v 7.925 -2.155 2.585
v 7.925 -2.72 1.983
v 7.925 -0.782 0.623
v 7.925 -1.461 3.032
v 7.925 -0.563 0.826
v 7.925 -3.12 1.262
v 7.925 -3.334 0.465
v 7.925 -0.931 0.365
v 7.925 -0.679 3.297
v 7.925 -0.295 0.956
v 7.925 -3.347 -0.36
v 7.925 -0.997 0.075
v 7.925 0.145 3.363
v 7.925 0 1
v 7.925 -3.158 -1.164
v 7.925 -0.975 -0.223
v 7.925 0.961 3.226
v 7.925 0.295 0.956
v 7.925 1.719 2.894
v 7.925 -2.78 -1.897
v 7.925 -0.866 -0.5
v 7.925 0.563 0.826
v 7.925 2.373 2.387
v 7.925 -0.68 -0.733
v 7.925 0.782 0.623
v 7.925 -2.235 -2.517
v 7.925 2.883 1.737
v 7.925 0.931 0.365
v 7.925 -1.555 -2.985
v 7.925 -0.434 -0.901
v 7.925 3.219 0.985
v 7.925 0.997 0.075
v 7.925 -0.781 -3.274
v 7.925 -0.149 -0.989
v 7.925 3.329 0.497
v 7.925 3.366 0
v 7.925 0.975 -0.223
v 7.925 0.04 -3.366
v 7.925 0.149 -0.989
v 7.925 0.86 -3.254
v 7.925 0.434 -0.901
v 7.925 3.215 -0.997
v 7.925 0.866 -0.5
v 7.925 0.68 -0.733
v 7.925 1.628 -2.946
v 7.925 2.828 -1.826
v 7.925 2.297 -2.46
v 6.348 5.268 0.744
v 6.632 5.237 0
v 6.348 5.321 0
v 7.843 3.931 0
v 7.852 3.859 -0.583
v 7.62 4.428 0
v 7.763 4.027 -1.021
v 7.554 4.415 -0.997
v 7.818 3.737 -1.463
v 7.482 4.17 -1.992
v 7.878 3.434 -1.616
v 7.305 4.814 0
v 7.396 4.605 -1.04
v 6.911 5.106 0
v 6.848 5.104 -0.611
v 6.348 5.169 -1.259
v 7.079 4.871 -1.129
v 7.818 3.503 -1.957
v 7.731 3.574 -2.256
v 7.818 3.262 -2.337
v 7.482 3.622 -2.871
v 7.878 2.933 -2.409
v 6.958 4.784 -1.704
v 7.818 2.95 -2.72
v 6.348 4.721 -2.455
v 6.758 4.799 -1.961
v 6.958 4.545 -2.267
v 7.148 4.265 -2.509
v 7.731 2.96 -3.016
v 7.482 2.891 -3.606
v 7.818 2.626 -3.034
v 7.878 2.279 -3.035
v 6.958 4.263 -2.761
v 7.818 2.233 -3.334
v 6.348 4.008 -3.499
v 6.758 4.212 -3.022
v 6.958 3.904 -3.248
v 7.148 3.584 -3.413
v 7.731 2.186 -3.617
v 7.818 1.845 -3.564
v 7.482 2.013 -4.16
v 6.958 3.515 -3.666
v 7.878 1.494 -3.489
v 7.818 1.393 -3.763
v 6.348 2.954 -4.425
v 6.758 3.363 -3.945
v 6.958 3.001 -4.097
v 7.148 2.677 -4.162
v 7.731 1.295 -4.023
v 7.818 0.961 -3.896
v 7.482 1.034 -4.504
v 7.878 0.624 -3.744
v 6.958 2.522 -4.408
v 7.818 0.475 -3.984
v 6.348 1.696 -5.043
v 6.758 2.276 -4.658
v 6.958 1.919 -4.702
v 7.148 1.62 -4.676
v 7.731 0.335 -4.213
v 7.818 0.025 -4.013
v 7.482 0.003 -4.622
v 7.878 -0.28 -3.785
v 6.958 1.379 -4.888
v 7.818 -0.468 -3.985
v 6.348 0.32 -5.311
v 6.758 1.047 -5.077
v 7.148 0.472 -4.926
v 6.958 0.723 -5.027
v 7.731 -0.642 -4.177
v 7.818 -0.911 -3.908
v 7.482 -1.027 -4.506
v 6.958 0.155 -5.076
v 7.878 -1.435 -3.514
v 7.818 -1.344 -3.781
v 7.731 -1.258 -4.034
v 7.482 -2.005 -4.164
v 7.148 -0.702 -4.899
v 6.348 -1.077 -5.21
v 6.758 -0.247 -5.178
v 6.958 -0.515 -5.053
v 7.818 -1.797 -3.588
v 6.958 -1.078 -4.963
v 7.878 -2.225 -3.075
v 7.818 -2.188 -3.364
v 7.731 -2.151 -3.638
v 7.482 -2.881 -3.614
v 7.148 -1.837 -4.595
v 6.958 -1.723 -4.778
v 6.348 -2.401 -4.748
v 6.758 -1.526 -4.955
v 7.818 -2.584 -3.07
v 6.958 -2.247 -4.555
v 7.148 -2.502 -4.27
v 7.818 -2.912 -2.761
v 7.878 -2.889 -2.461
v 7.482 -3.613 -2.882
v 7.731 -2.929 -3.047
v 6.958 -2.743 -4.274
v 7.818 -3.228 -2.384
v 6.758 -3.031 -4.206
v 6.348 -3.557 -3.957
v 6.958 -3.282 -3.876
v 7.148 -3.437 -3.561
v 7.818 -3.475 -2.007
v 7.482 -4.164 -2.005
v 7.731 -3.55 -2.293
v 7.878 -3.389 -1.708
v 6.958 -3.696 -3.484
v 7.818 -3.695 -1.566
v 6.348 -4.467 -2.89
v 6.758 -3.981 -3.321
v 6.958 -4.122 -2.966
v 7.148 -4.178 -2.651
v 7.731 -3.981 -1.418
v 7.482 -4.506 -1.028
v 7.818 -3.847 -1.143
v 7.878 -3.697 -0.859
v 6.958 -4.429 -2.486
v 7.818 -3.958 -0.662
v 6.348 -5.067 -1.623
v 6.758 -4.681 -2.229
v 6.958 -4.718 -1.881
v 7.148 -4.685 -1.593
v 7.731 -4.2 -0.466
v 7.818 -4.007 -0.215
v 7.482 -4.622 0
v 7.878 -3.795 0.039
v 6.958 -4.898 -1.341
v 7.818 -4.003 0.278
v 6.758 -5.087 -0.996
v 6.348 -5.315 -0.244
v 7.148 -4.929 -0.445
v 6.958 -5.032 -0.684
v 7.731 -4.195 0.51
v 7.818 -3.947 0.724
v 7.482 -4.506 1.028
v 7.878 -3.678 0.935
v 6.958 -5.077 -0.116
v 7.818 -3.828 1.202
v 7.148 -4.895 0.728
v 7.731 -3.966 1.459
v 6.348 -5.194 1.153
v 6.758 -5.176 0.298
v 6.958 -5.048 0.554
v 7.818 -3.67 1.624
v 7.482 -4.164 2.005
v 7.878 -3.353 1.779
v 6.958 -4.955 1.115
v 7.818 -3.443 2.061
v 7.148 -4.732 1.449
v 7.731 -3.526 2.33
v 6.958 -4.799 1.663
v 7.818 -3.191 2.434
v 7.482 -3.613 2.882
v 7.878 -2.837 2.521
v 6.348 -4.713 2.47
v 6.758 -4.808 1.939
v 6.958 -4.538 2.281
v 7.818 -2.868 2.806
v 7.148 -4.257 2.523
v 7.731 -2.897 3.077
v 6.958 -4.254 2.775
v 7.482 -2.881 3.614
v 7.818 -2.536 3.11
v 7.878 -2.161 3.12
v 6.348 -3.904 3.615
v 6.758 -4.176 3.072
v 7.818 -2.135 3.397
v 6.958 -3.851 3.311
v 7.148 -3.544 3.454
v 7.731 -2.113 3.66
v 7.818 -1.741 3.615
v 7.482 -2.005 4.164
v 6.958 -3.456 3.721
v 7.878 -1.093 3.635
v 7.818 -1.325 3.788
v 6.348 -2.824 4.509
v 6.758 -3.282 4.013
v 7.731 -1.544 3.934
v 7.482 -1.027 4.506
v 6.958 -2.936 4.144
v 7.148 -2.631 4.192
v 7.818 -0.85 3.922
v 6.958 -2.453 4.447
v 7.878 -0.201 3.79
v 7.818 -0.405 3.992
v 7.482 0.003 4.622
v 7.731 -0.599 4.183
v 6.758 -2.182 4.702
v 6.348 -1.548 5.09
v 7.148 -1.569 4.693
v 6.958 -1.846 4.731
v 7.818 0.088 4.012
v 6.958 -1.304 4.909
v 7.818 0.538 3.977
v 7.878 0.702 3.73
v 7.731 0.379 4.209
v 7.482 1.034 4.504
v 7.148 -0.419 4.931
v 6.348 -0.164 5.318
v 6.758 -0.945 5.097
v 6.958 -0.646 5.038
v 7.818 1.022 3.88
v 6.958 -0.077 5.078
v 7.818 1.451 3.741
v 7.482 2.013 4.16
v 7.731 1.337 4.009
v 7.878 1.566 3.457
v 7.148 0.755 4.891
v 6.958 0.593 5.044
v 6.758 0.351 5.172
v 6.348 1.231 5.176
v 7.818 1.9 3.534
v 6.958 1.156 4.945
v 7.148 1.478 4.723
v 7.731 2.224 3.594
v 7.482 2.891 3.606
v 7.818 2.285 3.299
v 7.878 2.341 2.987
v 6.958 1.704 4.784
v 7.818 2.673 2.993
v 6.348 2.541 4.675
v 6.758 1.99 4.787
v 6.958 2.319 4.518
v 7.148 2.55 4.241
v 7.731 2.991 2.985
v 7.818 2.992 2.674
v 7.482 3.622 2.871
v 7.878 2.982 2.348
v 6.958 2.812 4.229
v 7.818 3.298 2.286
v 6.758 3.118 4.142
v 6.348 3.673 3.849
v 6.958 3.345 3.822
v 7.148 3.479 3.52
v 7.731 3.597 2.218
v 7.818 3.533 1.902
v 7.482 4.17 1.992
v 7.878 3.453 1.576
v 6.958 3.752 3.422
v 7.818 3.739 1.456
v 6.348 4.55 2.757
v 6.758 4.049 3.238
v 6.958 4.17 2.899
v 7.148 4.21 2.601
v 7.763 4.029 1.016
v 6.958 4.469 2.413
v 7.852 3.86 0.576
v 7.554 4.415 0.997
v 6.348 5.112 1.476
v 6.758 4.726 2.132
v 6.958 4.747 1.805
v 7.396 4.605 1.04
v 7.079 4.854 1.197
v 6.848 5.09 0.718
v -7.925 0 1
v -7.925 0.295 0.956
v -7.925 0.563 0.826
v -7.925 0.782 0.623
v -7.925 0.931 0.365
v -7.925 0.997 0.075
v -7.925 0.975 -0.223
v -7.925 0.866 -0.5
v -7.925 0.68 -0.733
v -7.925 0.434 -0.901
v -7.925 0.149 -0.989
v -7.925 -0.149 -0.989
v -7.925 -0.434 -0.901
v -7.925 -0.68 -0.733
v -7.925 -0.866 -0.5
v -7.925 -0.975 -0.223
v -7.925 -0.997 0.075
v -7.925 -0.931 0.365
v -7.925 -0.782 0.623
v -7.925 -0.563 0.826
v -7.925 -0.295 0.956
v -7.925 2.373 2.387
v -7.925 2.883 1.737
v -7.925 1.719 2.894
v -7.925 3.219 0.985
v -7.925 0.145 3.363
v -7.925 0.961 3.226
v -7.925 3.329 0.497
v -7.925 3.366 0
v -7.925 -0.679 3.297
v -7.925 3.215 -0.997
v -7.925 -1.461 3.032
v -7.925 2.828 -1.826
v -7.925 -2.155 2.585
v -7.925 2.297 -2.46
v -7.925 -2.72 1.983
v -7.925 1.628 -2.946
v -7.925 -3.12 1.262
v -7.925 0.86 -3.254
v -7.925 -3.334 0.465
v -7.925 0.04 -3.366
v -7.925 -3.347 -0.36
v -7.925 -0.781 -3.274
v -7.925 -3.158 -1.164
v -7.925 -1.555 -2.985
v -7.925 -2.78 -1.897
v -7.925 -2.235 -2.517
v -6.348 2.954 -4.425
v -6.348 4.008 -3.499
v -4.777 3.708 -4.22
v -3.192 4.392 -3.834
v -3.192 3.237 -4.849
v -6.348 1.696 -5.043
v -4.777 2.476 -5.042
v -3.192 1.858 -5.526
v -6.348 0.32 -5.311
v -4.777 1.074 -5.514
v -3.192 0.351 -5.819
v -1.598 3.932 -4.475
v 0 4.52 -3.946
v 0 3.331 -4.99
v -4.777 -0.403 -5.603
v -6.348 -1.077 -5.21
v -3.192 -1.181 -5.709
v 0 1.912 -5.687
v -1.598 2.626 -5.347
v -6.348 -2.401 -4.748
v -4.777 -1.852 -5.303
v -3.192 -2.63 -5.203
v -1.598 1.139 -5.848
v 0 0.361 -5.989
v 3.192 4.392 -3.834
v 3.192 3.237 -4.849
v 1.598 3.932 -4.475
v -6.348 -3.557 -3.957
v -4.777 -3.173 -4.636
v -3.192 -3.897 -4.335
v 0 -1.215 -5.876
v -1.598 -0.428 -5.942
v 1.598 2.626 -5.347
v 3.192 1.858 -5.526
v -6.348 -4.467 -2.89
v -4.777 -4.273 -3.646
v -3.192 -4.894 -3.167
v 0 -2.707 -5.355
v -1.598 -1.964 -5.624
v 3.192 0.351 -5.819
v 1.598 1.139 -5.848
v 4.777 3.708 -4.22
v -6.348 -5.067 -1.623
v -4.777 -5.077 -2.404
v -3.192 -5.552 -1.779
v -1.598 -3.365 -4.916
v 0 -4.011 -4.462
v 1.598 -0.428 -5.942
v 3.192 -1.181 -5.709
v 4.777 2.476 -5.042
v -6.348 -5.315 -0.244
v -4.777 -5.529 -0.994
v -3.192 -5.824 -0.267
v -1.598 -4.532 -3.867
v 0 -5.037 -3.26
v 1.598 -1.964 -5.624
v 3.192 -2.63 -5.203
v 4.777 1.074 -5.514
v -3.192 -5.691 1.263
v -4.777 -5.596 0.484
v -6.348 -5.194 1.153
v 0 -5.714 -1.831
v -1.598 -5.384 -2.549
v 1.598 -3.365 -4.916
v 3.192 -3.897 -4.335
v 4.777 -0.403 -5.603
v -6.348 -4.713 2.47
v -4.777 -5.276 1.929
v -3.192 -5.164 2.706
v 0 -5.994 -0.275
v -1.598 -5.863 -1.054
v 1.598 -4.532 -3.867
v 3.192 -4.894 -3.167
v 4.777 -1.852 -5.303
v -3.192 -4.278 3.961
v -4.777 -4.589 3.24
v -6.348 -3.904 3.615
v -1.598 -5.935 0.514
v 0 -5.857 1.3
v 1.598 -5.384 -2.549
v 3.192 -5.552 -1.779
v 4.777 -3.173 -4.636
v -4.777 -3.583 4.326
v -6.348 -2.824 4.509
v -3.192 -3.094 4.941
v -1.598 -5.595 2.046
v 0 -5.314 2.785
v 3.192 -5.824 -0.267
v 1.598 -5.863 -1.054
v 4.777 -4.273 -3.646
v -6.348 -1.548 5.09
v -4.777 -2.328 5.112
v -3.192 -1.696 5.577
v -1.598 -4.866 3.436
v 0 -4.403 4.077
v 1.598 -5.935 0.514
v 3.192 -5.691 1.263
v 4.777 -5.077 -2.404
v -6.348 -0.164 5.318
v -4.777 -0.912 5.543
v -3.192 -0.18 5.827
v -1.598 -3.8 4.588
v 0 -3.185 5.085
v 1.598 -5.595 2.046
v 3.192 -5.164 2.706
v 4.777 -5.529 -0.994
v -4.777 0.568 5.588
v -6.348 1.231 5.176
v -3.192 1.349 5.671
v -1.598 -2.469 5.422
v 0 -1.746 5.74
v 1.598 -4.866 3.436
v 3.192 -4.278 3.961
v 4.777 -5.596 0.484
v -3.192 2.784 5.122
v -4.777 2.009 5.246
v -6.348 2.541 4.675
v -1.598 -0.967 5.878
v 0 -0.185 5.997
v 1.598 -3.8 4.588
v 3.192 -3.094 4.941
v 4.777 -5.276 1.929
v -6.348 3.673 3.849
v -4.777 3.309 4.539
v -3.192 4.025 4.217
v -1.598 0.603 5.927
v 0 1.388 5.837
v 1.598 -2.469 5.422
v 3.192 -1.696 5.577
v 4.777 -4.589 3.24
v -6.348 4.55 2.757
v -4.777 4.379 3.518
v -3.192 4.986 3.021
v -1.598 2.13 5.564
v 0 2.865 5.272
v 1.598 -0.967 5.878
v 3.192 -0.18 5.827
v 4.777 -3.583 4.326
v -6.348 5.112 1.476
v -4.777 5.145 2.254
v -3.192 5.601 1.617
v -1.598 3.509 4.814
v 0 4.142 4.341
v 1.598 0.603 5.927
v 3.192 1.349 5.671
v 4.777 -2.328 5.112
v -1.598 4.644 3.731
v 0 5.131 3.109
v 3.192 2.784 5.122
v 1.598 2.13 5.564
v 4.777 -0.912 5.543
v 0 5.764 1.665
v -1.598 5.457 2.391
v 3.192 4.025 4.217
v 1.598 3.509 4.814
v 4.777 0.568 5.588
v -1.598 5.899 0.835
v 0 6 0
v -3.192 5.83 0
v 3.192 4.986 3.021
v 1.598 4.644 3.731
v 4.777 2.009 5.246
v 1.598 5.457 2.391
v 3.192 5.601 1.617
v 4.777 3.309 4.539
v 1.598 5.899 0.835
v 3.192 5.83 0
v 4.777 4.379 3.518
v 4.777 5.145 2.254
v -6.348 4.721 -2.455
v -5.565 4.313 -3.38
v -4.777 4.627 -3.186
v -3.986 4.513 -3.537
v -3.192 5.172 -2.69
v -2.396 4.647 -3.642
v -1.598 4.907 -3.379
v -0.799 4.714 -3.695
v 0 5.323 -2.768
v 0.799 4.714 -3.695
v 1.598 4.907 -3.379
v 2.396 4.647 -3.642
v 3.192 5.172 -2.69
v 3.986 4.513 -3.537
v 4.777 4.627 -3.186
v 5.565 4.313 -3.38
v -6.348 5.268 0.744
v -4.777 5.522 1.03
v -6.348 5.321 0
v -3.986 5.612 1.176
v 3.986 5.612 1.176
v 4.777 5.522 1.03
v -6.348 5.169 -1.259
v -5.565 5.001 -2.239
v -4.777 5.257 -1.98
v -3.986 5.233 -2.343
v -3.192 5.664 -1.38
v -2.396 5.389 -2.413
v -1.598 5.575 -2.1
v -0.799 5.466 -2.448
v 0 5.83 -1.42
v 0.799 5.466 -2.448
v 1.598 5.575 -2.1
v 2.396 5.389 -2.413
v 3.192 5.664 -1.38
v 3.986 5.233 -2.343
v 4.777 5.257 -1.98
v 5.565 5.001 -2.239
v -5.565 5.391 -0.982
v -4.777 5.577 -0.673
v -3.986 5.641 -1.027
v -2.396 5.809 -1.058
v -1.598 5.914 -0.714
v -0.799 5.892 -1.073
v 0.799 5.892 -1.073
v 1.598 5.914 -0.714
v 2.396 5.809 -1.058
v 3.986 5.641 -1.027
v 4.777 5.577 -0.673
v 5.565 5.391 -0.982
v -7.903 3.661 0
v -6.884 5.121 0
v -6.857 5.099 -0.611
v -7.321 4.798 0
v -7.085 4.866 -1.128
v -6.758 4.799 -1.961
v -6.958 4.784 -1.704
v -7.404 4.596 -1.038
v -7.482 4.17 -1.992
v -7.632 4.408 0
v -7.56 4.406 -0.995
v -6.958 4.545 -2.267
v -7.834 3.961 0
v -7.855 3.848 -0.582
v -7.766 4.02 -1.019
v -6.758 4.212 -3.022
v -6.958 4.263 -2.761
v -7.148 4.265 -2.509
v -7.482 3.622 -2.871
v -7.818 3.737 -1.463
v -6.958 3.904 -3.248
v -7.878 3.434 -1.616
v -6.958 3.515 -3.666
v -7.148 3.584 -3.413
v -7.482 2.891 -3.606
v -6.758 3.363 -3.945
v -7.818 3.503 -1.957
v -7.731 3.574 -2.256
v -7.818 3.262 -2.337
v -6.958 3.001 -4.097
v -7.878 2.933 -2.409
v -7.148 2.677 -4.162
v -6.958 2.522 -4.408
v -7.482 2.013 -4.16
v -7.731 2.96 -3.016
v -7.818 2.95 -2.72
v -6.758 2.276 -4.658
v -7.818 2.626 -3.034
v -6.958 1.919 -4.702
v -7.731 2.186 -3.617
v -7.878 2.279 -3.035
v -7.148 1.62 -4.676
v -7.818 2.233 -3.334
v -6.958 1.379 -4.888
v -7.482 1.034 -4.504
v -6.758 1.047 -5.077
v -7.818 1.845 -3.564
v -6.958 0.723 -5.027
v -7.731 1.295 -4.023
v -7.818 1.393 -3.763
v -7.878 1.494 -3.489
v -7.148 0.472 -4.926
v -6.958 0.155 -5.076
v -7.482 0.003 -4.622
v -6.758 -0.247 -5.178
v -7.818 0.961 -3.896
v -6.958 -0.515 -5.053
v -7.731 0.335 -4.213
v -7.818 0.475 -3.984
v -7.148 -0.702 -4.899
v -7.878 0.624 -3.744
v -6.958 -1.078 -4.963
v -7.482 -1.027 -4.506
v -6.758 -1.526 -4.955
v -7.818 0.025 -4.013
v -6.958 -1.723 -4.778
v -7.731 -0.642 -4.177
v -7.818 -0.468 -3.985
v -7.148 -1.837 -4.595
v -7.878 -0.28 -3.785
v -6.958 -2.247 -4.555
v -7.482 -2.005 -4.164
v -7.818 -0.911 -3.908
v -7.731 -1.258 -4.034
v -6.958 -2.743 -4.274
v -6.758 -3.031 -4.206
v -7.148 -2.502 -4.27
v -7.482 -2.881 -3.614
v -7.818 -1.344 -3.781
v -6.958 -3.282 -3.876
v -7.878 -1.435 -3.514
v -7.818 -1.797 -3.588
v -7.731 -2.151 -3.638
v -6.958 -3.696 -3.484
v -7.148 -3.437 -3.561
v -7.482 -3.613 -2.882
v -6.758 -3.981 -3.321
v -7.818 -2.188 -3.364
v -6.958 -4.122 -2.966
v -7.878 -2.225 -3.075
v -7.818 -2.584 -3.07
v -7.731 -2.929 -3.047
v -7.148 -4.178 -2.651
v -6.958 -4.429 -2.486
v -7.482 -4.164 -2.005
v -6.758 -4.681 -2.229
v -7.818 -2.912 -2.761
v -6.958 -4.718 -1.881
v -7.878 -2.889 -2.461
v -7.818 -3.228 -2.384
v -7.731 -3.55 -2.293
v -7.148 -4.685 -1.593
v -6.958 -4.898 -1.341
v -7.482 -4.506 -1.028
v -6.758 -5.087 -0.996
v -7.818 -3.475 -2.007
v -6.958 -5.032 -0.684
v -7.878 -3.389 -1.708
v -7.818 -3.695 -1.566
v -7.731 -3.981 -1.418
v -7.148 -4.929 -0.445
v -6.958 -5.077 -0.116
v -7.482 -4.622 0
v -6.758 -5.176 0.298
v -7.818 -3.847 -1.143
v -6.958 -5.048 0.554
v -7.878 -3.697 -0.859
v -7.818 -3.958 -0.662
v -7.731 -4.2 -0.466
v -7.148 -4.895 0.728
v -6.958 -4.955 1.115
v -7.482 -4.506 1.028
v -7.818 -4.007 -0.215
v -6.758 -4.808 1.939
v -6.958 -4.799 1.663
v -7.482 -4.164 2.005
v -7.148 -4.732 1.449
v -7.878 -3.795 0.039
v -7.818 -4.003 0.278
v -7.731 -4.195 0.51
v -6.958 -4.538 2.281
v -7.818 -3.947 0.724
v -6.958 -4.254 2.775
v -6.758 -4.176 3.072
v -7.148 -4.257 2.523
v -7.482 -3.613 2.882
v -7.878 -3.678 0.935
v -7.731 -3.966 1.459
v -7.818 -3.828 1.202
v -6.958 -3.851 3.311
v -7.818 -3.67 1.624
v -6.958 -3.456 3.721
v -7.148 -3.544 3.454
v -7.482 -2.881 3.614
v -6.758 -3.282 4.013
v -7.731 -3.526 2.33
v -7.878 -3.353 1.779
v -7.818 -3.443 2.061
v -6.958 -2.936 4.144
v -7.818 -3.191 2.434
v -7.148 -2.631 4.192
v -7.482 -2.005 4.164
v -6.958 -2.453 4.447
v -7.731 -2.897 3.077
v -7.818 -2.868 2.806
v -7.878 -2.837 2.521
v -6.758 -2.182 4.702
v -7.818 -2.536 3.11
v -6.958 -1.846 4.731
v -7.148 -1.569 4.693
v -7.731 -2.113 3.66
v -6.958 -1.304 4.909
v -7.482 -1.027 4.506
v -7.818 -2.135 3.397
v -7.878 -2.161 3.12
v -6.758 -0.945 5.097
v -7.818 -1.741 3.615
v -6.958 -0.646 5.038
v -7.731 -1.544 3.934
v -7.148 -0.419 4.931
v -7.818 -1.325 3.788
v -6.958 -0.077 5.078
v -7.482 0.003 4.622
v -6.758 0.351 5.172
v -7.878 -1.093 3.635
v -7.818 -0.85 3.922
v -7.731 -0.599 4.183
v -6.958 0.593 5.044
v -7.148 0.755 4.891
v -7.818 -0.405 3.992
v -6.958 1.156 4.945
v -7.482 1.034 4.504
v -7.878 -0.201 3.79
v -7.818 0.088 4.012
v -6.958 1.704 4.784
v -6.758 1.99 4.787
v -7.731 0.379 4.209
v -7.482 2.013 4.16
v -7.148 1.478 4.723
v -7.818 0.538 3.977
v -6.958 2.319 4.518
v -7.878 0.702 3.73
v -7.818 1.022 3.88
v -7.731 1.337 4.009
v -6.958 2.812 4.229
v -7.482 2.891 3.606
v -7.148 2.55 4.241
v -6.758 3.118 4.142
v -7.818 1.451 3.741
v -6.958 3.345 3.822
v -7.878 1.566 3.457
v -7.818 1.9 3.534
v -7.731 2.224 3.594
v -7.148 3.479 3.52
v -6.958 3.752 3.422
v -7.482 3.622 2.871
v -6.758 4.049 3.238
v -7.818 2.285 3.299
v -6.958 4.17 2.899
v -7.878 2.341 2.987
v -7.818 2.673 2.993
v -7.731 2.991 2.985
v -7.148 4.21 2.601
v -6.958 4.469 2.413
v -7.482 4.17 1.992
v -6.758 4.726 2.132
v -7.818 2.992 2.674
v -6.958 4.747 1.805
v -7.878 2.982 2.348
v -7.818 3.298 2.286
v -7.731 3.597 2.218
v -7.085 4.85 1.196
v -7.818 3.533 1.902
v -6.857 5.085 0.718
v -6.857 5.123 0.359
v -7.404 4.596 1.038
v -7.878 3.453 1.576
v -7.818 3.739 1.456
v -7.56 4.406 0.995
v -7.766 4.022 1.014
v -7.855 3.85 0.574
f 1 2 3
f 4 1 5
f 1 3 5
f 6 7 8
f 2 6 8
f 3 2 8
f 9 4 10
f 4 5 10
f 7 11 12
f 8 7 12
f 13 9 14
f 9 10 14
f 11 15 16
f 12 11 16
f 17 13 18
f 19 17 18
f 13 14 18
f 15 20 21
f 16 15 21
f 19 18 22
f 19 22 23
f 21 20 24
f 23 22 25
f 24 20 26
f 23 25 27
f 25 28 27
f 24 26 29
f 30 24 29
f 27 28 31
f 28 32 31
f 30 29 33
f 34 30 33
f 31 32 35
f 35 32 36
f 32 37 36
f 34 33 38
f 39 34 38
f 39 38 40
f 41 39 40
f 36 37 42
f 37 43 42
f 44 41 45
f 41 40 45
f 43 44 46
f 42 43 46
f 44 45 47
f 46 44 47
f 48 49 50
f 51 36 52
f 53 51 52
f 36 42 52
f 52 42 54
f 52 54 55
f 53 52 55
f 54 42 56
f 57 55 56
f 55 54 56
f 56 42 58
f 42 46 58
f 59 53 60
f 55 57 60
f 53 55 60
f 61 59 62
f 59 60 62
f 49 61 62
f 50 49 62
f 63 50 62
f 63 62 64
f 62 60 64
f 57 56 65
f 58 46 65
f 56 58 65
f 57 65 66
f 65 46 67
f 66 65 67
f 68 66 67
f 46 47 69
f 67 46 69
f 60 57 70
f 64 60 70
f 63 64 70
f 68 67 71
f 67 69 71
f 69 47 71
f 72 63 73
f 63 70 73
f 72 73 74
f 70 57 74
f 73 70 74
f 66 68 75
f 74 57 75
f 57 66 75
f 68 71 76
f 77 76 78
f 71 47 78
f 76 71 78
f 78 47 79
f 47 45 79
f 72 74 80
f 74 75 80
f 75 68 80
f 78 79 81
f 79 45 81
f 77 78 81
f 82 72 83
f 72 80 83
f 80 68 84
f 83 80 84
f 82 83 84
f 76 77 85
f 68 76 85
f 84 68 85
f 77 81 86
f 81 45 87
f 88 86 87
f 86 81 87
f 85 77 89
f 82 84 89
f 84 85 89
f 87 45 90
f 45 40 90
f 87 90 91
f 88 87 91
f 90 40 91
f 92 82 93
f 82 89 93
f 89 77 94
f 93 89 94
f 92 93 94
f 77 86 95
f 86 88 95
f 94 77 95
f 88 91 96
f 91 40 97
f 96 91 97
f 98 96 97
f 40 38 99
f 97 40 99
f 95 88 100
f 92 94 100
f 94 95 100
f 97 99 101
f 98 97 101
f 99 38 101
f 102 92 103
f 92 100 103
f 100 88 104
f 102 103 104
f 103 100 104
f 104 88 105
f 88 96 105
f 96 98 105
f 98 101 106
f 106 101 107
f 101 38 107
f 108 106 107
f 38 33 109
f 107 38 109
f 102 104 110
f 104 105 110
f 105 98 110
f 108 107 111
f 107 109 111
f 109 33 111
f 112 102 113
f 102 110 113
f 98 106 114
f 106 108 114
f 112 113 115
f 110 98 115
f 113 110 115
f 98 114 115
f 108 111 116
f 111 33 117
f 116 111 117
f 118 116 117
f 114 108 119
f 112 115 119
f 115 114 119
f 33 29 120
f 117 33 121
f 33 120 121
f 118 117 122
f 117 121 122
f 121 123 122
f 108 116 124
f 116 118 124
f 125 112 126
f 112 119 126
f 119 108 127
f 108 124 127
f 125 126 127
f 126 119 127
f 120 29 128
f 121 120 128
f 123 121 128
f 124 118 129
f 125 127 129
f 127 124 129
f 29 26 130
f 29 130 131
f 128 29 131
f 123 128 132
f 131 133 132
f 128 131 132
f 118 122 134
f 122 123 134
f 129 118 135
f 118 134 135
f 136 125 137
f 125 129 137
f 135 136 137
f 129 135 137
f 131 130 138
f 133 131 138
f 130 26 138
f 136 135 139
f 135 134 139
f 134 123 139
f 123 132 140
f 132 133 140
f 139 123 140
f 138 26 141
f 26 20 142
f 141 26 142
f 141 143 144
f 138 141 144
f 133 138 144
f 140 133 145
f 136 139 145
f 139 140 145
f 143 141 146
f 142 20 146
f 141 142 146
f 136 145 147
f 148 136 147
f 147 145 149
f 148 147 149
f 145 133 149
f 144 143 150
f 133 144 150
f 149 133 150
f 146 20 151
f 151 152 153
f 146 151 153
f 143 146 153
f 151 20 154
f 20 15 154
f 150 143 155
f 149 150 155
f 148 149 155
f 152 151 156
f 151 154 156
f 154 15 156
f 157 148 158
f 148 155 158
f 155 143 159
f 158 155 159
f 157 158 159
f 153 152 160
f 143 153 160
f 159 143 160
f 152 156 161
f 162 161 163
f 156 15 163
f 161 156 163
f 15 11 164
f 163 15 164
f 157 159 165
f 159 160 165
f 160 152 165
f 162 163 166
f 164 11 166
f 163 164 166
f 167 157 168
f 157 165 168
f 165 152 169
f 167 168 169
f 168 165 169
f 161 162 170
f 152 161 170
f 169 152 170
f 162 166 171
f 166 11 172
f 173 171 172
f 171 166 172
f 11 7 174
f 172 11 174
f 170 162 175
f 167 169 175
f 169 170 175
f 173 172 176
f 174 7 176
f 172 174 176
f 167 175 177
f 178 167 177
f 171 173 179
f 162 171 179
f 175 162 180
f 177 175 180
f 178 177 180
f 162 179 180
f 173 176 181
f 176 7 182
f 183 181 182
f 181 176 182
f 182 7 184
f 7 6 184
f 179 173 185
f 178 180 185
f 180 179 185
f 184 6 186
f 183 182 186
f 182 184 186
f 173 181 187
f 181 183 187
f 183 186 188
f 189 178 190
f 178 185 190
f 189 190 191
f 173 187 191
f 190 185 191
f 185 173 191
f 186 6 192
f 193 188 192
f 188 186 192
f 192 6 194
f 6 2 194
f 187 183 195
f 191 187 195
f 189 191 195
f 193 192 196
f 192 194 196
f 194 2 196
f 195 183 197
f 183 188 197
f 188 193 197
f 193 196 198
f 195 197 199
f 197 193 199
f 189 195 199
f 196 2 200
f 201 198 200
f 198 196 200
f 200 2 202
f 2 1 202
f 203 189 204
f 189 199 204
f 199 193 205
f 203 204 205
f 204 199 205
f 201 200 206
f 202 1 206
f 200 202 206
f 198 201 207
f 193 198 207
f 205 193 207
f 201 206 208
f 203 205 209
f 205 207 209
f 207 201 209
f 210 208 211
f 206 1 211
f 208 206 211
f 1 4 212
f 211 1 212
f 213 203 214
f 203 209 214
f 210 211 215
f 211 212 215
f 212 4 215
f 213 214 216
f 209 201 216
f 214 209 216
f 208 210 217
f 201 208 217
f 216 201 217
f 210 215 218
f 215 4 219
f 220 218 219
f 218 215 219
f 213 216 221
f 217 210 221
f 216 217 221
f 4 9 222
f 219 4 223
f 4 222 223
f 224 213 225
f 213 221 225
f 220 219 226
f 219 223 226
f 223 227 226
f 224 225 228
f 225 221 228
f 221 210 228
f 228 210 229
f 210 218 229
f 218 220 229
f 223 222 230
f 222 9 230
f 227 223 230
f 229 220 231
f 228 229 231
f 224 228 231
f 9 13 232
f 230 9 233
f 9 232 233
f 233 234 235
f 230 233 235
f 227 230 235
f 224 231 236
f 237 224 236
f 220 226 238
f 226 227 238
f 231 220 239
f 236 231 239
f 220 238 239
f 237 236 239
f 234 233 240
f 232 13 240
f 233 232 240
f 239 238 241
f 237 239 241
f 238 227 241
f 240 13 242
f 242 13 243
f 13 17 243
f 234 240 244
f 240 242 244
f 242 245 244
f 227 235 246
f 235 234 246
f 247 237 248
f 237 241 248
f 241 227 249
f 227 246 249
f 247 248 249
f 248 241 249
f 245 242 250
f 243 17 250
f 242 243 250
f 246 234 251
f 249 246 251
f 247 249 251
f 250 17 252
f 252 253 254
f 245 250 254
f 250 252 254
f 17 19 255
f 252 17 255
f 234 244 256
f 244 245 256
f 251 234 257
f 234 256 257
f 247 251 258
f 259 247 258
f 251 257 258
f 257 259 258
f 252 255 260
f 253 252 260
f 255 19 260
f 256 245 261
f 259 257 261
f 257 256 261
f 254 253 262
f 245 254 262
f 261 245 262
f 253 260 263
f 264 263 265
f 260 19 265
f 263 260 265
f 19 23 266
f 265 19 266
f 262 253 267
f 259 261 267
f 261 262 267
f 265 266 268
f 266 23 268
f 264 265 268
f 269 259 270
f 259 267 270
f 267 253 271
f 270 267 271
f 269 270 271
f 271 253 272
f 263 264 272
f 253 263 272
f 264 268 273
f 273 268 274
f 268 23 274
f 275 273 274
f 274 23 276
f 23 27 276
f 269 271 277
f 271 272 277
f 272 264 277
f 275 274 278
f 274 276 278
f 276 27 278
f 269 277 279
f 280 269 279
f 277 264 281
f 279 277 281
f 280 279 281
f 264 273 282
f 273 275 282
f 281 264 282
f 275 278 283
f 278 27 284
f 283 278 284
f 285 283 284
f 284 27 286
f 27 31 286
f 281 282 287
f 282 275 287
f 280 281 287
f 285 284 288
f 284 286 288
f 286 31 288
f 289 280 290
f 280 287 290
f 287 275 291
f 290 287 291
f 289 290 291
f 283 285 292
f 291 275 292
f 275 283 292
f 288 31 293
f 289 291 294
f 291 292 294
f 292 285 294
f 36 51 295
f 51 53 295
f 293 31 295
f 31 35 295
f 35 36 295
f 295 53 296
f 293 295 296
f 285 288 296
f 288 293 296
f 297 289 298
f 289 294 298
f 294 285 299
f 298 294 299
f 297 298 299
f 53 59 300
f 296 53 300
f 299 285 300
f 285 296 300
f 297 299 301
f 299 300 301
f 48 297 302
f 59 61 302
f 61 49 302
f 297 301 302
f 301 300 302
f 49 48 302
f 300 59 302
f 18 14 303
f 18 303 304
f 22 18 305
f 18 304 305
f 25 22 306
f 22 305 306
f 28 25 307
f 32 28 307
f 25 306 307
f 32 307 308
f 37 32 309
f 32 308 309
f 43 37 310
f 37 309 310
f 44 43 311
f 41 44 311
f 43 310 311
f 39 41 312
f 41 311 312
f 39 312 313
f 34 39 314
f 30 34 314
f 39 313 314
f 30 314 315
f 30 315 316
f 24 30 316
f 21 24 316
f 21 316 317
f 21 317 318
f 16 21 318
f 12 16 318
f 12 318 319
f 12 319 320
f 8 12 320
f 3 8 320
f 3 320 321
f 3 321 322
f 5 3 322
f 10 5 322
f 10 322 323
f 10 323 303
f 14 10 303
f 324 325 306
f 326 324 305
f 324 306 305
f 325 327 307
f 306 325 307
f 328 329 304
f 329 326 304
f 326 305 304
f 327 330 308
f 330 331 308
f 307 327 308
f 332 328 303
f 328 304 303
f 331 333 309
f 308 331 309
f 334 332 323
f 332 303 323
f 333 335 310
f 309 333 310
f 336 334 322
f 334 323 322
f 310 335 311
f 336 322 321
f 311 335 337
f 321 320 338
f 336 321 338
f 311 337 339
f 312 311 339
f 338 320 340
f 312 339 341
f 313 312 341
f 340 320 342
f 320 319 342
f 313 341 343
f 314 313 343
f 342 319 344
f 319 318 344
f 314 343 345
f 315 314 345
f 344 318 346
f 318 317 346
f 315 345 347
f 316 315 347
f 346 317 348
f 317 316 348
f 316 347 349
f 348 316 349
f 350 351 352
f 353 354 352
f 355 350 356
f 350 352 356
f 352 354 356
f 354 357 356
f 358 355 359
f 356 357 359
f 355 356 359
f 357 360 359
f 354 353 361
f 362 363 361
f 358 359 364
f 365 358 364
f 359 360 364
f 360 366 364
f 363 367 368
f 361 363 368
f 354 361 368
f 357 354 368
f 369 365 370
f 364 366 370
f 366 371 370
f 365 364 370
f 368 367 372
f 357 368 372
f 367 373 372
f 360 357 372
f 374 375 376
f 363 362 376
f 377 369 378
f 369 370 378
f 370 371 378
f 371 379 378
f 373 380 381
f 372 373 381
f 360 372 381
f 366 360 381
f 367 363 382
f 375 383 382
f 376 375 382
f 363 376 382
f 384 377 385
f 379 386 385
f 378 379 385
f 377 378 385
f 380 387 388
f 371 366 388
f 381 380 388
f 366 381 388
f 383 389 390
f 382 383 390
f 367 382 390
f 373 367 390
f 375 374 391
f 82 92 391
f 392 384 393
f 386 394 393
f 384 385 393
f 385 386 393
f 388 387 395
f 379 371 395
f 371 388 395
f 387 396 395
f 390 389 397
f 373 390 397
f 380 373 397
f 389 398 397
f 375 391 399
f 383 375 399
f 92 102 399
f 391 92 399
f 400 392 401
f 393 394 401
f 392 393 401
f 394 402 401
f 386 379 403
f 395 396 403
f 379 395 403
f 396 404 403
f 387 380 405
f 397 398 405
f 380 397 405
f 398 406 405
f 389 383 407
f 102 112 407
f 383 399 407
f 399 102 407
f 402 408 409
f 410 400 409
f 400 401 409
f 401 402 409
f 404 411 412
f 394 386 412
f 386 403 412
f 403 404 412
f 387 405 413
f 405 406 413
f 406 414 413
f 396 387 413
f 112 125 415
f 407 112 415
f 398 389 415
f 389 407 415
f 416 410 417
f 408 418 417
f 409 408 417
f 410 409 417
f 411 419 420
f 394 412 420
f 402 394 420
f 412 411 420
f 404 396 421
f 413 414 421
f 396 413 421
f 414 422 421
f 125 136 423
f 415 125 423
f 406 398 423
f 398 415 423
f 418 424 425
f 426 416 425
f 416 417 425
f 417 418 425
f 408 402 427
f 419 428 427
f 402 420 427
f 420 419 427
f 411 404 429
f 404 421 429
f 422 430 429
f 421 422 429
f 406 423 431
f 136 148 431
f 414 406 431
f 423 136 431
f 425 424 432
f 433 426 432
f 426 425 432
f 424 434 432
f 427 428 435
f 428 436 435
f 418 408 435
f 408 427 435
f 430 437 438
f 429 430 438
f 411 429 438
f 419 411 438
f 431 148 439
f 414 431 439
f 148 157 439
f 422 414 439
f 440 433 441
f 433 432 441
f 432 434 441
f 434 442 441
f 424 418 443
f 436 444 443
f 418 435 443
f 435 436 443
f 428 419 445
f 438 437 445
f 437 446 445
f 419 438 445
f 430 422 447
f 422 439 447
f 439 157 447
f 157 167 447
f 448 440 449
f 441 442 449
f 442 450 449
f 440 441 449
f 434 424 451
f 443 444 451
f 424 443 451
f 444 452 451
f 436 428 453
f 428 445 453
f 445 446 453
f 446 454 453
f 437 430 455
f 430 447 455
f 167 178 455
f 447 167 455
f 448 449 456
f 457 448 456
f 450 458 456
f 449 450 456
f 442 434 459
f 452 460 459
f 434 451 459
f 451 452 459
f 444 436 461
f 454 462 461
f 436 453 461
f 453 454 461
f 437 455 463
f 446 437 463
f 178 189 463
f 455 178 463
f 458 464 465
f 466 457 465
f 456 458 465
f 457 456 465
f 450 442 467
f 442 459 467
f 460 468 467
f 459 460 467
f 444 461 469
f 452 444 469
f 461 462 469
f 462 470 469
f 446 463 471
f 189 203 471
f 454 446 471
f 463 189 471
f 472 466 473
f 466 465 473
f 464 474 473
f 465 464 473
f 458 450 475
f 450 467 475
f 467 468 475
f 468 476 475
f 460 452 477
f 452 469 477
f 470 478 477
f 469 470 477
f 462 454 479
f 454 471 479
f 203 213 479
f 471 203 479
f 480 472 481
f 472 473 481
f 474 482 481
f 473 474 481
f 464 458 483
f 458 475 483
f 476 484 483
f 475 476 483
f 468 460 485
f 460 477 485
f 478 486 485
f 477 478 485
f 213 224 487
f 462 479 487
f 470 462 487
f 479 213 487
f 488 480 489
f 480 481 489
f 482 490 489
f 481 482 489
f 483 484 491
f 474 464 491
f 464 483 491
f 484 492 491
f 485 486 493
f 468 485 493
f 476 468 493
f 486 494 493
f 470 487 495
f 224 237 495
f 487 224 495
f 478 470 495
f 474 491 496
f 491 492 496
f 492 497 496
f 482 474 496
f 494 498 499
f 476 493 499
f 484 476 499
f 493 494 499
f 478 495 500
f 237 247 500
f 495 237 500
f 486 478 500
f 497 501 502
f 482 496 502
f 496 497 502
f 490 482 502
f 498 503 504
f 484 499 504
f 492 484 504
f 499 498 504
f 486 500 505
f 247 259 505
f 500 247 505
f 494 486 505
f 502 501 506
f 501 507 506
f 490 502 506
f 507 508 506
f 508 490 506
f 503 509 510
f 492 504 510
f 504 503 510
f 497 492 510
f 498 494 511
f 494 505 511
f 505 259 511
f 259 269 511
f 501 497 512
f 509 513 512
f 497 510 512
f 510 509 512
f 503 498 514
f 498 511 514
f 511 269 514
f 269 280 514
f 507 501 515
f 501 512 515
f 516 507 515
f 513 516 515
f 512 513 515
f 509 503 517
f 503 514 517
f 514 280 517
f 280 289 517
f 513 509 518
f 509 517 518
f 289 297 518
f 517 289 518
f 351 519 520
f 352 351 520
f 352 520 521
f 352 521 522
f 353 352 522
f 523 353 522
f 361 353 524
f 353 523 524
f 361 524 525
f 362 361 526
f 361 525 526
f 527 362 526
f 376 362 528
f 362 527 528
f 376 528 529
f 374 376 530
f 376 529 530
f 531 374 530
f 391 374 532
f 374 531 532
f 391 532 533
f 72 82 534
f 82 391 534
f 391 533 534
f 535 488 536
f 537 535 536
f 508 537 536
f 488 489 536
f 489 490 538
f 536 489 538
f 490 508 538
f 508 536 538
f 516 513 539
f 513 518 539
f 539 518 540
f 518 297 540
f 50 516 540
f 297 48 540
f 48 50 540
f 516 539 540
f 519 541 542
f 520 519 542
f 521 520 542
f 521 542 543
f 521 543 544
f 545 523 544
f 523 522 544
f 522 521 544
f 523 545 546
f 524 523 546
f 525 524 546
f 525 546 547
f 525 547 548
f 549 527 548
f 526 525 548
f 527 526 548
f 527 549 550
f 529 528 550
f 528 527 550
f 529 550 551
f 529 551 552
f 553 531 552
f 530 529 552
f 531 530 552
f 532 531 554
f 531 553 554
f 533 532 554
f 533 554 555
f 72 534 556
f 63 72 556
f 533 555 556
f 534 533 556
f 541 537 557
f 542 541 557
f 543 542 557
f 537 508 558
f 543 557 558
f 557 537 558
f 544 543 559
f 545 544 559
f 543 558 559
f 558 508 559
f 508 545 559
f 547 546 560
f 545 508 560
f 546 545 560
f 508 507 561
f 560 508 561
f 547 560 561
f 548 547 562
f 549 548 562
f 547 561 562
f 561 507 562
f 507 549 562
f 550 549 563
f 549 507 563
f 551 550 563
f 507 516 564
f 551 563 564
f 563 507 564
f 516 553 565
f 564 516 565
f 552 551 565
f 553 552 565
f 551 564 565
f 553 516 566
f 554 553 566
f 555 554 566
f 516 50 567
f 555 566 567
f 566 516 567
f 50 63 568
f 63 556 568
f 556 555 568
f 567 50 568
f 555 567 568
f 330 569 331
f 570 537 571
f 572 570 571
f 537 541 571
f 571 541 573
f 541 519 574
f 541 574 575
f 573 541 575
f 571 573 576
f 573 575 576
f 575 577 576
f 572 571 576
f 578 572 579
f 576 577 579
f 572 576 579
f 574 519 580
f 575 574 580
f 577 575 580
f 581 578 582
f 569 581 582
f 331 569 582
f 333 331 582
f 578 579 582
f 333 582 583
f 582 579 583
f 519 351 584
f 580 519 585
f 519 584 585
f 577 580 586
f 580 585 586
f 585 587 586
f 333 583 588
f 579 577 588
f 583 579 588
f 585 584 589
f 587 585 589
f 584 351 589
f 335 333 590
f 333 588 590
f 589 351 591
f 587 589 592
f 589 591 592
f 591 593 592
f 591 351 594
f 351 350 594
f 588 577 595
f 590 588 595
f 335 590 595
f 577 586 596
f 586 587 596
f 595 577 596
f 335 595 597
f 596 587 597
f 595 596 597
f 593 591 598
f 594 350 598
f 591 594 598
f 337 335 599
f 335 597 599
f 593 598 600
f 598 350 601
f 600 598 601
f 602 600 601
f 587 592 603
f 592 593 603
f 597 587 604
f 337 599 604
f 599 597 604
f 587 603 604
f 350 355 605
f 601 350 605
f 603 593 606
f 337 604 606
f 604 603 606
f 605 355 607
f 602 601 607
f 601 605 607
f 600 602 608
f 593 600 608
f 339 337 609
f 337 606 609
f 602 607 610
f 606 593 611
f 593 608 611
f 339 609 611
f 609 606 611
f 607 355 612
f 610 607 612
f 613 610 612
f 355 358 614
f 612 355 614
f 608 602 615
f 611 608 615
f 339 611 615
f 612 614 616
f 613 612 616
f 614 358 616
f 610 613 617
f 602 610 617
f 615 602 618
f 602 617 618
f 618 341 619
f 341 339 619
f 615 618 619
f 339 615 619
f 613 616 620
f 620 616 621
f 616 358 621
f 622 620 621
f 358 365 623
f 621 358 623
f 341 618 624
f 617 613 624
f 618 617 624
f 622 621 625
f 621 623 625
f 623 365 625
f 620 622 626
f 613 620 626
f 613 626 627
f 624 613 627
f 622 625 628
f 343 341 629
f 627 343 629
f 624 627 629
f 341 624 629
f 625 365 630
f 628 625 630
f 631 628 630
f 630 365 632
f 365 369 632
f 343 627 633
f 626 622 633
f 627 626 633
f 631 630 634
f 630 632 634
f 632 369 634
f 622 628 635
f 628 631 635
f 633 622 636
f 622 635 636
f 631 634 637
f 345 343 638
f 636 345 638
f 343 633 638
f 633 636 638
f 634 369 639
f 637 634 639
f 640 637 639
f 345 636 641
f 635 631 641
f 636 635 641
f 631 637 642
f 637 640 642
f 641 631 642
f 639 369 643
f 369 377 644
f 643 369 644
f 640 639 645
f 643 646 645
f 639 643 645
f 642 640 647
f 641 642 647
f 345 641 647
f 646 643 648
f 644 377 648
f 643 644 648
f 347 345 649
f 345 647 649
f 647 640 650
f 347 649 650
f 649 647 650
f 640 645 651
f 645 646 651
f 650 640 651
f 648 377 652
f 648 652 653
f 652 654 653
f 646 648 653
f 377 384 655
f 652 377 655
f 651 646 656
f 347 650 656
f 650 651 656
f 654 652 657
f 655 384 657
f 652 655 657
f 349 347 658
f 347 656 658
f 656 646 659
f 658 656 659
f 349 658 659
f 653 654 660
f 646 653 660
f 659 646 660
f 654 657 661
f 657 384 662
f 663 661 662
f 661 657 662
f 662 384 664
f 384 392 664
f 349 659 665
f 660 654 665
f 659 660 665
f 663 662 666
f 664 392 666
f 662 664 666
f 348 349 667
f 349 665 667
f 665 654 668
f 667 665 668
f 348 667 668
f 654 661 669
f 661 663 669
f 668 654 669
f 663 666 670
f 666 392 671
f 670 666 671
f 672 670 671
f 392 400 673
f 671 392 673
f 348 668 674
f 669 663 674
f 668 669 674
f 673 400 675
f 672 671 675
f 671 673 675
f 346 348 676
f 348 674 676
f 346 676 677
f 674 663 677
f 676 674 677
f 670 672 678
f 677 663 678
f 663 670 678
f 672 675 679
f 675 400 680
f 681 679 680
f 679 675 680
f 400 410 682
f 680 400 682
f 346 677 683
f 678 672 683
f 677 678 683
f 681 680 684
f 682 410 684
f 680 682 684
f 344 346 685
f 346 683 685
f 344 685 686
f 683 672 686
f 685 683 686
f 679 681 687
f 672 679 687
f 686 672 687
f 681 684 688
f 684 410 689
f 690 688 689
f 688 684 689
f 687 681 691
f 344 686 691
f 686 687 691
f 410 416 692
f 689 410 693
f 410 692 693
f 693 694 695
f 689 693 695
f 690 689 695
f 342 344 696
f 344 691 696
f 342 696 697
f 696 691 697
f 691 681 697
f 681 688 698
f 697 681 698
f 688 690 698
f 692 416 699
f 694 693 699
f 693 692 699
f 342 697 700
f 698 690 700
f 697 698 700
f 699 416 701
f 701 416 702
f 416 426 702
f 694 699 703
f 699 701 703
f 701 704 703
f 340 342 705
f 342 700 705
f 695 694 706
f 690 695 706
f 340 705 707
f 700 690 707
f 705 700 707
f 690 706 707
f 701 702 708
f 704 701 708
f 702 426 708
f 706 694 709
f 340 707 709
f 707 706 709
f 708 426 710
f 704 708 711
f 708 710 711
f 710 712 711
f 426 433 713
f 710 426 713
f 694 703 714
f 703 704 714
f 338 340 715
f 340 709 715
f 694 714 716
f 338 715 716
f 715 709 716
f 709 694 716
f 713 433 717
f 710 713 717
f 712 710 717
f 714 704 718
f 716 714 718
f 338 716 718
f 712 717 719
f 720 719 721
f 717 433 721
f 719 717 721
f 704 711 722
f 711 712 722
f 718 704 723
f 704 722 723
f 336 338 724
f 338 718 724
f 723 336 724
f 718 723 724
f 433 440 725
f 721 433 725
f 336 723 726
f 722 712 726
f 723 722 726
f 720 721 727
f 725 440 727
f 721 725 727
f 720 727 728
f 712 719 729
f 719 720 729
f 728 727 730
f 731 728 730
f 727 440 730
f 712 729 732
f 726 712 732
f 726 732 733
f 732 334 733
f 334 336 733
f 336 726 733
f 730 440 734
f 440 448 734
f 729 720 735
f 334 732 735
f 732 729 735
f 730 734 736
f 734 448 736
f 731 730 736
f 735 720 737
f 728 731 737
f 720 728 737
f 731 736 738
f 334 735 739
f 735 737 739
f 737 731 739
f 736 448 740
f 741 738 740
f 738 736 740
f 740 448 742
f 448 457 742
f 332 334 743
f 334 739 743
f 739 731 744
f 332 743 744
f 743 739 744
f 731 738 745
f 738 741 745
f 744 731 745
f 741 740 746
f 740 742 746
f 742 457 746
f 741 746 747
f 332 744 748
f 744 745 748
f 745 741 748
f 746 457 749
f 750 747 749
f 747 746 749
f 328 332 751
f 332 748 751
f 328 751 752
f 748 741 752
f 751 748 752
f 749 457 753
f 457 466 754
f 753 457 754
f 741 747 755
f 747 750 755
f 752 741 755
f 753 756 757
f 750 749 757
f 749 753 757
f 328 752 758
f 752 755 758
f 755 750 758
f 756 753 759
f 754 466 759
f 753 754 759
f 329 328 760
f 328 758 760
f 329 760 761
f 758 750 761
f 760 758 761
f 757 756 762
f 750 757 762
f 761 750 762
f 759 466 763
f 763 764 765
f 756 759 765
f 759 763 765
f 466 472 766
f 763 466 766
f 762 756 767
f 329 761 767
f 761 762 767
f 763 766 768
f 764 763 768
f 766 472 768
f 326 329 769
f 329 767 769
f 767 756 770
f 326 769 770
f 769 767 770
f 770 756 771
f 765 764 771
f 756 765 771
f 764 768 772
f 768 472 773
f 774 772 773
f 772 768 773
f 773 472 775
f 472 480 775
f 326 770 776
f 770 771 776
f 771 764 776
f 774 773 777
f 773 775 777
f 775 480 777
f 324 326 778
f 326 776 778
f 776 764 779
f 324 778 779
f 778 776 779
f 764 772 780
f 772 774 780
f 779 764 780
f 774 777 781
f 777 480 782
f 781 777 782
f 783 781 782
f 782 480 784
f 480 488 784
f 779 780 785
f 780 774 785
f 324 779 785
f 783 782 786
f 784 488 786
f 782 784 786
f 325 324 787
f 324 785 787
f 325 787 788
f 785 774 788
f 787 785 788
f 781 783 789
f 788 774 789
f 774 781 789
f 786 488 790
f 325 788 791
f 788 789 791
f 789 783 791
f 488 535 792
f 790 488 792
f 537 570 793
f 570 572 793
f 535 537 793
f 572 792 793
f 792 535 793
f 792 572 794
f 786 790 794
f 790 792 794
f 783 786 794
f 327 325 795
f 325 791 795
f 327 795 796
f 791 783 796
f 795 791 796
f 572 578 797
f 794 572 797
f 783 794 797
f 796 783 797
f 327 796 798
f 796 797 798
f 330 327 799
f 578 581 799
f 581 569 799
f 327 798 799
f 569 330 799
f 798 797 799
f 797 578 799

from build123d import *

# Parameters (mm, degrees)
RACCORDO1_R          = 2
RACCORDO2_R          = 2
FORO_0_2_0_2_1_D     = 2
FORO_0_2_0_2_1_DEPTH = 15.85


with BuildPart() as part:
    # Schizzo1 → Rivoluzione1 (revolve)
    with BuildSketch(Plane(origin=(0, 0, 0), x_dir=(-1, 0, 0), z_dir=(0, 0, -1))):
        with BuildLine():
            Line((-7.925, 4.934311379), (-7.925, 0))
            Line((-7.925, 0), (7.925, 0))
            Line((7.925, 0), (7.925, 4.934311379))
            ThreePointArc((7.925, 4.934311379), (0, 6), (-7.925, 4.934311379))
        make_face()
    revolve(axis=Axis((7.925, 0, 0), (-1, 0, 0)))

    # Raccordo1
    raccordo1_edges = [part.edges().sort_by_distance(p)[0] for p in [
        (7.925, -4.934311379, 0),
    ]]
    fillet(raccordo1_edges, radius=RACCORDO1_R)

    # Raccordo2
    raccordo2_edges = [part.edges().sort_by_distance(p)[0] for p in [
        (-7.925, -4.934311379, 0),
    ]]
    fillet(raccordo2_edges, radius=RACCORDO2_R)

    # Foro Ø0.2 (0.2)-1
    with Locations(Plane(origin=(7.925, 0, 0), x_dir=(0, 0, -1), z_dir=(1, 0, 0))):
        with Locations((0, 0)):
            Hole(FORO_0_2_0_2_1_D / 2, depth=FORO_0_2_0_2_1_DEPTH)


solid = part.part
